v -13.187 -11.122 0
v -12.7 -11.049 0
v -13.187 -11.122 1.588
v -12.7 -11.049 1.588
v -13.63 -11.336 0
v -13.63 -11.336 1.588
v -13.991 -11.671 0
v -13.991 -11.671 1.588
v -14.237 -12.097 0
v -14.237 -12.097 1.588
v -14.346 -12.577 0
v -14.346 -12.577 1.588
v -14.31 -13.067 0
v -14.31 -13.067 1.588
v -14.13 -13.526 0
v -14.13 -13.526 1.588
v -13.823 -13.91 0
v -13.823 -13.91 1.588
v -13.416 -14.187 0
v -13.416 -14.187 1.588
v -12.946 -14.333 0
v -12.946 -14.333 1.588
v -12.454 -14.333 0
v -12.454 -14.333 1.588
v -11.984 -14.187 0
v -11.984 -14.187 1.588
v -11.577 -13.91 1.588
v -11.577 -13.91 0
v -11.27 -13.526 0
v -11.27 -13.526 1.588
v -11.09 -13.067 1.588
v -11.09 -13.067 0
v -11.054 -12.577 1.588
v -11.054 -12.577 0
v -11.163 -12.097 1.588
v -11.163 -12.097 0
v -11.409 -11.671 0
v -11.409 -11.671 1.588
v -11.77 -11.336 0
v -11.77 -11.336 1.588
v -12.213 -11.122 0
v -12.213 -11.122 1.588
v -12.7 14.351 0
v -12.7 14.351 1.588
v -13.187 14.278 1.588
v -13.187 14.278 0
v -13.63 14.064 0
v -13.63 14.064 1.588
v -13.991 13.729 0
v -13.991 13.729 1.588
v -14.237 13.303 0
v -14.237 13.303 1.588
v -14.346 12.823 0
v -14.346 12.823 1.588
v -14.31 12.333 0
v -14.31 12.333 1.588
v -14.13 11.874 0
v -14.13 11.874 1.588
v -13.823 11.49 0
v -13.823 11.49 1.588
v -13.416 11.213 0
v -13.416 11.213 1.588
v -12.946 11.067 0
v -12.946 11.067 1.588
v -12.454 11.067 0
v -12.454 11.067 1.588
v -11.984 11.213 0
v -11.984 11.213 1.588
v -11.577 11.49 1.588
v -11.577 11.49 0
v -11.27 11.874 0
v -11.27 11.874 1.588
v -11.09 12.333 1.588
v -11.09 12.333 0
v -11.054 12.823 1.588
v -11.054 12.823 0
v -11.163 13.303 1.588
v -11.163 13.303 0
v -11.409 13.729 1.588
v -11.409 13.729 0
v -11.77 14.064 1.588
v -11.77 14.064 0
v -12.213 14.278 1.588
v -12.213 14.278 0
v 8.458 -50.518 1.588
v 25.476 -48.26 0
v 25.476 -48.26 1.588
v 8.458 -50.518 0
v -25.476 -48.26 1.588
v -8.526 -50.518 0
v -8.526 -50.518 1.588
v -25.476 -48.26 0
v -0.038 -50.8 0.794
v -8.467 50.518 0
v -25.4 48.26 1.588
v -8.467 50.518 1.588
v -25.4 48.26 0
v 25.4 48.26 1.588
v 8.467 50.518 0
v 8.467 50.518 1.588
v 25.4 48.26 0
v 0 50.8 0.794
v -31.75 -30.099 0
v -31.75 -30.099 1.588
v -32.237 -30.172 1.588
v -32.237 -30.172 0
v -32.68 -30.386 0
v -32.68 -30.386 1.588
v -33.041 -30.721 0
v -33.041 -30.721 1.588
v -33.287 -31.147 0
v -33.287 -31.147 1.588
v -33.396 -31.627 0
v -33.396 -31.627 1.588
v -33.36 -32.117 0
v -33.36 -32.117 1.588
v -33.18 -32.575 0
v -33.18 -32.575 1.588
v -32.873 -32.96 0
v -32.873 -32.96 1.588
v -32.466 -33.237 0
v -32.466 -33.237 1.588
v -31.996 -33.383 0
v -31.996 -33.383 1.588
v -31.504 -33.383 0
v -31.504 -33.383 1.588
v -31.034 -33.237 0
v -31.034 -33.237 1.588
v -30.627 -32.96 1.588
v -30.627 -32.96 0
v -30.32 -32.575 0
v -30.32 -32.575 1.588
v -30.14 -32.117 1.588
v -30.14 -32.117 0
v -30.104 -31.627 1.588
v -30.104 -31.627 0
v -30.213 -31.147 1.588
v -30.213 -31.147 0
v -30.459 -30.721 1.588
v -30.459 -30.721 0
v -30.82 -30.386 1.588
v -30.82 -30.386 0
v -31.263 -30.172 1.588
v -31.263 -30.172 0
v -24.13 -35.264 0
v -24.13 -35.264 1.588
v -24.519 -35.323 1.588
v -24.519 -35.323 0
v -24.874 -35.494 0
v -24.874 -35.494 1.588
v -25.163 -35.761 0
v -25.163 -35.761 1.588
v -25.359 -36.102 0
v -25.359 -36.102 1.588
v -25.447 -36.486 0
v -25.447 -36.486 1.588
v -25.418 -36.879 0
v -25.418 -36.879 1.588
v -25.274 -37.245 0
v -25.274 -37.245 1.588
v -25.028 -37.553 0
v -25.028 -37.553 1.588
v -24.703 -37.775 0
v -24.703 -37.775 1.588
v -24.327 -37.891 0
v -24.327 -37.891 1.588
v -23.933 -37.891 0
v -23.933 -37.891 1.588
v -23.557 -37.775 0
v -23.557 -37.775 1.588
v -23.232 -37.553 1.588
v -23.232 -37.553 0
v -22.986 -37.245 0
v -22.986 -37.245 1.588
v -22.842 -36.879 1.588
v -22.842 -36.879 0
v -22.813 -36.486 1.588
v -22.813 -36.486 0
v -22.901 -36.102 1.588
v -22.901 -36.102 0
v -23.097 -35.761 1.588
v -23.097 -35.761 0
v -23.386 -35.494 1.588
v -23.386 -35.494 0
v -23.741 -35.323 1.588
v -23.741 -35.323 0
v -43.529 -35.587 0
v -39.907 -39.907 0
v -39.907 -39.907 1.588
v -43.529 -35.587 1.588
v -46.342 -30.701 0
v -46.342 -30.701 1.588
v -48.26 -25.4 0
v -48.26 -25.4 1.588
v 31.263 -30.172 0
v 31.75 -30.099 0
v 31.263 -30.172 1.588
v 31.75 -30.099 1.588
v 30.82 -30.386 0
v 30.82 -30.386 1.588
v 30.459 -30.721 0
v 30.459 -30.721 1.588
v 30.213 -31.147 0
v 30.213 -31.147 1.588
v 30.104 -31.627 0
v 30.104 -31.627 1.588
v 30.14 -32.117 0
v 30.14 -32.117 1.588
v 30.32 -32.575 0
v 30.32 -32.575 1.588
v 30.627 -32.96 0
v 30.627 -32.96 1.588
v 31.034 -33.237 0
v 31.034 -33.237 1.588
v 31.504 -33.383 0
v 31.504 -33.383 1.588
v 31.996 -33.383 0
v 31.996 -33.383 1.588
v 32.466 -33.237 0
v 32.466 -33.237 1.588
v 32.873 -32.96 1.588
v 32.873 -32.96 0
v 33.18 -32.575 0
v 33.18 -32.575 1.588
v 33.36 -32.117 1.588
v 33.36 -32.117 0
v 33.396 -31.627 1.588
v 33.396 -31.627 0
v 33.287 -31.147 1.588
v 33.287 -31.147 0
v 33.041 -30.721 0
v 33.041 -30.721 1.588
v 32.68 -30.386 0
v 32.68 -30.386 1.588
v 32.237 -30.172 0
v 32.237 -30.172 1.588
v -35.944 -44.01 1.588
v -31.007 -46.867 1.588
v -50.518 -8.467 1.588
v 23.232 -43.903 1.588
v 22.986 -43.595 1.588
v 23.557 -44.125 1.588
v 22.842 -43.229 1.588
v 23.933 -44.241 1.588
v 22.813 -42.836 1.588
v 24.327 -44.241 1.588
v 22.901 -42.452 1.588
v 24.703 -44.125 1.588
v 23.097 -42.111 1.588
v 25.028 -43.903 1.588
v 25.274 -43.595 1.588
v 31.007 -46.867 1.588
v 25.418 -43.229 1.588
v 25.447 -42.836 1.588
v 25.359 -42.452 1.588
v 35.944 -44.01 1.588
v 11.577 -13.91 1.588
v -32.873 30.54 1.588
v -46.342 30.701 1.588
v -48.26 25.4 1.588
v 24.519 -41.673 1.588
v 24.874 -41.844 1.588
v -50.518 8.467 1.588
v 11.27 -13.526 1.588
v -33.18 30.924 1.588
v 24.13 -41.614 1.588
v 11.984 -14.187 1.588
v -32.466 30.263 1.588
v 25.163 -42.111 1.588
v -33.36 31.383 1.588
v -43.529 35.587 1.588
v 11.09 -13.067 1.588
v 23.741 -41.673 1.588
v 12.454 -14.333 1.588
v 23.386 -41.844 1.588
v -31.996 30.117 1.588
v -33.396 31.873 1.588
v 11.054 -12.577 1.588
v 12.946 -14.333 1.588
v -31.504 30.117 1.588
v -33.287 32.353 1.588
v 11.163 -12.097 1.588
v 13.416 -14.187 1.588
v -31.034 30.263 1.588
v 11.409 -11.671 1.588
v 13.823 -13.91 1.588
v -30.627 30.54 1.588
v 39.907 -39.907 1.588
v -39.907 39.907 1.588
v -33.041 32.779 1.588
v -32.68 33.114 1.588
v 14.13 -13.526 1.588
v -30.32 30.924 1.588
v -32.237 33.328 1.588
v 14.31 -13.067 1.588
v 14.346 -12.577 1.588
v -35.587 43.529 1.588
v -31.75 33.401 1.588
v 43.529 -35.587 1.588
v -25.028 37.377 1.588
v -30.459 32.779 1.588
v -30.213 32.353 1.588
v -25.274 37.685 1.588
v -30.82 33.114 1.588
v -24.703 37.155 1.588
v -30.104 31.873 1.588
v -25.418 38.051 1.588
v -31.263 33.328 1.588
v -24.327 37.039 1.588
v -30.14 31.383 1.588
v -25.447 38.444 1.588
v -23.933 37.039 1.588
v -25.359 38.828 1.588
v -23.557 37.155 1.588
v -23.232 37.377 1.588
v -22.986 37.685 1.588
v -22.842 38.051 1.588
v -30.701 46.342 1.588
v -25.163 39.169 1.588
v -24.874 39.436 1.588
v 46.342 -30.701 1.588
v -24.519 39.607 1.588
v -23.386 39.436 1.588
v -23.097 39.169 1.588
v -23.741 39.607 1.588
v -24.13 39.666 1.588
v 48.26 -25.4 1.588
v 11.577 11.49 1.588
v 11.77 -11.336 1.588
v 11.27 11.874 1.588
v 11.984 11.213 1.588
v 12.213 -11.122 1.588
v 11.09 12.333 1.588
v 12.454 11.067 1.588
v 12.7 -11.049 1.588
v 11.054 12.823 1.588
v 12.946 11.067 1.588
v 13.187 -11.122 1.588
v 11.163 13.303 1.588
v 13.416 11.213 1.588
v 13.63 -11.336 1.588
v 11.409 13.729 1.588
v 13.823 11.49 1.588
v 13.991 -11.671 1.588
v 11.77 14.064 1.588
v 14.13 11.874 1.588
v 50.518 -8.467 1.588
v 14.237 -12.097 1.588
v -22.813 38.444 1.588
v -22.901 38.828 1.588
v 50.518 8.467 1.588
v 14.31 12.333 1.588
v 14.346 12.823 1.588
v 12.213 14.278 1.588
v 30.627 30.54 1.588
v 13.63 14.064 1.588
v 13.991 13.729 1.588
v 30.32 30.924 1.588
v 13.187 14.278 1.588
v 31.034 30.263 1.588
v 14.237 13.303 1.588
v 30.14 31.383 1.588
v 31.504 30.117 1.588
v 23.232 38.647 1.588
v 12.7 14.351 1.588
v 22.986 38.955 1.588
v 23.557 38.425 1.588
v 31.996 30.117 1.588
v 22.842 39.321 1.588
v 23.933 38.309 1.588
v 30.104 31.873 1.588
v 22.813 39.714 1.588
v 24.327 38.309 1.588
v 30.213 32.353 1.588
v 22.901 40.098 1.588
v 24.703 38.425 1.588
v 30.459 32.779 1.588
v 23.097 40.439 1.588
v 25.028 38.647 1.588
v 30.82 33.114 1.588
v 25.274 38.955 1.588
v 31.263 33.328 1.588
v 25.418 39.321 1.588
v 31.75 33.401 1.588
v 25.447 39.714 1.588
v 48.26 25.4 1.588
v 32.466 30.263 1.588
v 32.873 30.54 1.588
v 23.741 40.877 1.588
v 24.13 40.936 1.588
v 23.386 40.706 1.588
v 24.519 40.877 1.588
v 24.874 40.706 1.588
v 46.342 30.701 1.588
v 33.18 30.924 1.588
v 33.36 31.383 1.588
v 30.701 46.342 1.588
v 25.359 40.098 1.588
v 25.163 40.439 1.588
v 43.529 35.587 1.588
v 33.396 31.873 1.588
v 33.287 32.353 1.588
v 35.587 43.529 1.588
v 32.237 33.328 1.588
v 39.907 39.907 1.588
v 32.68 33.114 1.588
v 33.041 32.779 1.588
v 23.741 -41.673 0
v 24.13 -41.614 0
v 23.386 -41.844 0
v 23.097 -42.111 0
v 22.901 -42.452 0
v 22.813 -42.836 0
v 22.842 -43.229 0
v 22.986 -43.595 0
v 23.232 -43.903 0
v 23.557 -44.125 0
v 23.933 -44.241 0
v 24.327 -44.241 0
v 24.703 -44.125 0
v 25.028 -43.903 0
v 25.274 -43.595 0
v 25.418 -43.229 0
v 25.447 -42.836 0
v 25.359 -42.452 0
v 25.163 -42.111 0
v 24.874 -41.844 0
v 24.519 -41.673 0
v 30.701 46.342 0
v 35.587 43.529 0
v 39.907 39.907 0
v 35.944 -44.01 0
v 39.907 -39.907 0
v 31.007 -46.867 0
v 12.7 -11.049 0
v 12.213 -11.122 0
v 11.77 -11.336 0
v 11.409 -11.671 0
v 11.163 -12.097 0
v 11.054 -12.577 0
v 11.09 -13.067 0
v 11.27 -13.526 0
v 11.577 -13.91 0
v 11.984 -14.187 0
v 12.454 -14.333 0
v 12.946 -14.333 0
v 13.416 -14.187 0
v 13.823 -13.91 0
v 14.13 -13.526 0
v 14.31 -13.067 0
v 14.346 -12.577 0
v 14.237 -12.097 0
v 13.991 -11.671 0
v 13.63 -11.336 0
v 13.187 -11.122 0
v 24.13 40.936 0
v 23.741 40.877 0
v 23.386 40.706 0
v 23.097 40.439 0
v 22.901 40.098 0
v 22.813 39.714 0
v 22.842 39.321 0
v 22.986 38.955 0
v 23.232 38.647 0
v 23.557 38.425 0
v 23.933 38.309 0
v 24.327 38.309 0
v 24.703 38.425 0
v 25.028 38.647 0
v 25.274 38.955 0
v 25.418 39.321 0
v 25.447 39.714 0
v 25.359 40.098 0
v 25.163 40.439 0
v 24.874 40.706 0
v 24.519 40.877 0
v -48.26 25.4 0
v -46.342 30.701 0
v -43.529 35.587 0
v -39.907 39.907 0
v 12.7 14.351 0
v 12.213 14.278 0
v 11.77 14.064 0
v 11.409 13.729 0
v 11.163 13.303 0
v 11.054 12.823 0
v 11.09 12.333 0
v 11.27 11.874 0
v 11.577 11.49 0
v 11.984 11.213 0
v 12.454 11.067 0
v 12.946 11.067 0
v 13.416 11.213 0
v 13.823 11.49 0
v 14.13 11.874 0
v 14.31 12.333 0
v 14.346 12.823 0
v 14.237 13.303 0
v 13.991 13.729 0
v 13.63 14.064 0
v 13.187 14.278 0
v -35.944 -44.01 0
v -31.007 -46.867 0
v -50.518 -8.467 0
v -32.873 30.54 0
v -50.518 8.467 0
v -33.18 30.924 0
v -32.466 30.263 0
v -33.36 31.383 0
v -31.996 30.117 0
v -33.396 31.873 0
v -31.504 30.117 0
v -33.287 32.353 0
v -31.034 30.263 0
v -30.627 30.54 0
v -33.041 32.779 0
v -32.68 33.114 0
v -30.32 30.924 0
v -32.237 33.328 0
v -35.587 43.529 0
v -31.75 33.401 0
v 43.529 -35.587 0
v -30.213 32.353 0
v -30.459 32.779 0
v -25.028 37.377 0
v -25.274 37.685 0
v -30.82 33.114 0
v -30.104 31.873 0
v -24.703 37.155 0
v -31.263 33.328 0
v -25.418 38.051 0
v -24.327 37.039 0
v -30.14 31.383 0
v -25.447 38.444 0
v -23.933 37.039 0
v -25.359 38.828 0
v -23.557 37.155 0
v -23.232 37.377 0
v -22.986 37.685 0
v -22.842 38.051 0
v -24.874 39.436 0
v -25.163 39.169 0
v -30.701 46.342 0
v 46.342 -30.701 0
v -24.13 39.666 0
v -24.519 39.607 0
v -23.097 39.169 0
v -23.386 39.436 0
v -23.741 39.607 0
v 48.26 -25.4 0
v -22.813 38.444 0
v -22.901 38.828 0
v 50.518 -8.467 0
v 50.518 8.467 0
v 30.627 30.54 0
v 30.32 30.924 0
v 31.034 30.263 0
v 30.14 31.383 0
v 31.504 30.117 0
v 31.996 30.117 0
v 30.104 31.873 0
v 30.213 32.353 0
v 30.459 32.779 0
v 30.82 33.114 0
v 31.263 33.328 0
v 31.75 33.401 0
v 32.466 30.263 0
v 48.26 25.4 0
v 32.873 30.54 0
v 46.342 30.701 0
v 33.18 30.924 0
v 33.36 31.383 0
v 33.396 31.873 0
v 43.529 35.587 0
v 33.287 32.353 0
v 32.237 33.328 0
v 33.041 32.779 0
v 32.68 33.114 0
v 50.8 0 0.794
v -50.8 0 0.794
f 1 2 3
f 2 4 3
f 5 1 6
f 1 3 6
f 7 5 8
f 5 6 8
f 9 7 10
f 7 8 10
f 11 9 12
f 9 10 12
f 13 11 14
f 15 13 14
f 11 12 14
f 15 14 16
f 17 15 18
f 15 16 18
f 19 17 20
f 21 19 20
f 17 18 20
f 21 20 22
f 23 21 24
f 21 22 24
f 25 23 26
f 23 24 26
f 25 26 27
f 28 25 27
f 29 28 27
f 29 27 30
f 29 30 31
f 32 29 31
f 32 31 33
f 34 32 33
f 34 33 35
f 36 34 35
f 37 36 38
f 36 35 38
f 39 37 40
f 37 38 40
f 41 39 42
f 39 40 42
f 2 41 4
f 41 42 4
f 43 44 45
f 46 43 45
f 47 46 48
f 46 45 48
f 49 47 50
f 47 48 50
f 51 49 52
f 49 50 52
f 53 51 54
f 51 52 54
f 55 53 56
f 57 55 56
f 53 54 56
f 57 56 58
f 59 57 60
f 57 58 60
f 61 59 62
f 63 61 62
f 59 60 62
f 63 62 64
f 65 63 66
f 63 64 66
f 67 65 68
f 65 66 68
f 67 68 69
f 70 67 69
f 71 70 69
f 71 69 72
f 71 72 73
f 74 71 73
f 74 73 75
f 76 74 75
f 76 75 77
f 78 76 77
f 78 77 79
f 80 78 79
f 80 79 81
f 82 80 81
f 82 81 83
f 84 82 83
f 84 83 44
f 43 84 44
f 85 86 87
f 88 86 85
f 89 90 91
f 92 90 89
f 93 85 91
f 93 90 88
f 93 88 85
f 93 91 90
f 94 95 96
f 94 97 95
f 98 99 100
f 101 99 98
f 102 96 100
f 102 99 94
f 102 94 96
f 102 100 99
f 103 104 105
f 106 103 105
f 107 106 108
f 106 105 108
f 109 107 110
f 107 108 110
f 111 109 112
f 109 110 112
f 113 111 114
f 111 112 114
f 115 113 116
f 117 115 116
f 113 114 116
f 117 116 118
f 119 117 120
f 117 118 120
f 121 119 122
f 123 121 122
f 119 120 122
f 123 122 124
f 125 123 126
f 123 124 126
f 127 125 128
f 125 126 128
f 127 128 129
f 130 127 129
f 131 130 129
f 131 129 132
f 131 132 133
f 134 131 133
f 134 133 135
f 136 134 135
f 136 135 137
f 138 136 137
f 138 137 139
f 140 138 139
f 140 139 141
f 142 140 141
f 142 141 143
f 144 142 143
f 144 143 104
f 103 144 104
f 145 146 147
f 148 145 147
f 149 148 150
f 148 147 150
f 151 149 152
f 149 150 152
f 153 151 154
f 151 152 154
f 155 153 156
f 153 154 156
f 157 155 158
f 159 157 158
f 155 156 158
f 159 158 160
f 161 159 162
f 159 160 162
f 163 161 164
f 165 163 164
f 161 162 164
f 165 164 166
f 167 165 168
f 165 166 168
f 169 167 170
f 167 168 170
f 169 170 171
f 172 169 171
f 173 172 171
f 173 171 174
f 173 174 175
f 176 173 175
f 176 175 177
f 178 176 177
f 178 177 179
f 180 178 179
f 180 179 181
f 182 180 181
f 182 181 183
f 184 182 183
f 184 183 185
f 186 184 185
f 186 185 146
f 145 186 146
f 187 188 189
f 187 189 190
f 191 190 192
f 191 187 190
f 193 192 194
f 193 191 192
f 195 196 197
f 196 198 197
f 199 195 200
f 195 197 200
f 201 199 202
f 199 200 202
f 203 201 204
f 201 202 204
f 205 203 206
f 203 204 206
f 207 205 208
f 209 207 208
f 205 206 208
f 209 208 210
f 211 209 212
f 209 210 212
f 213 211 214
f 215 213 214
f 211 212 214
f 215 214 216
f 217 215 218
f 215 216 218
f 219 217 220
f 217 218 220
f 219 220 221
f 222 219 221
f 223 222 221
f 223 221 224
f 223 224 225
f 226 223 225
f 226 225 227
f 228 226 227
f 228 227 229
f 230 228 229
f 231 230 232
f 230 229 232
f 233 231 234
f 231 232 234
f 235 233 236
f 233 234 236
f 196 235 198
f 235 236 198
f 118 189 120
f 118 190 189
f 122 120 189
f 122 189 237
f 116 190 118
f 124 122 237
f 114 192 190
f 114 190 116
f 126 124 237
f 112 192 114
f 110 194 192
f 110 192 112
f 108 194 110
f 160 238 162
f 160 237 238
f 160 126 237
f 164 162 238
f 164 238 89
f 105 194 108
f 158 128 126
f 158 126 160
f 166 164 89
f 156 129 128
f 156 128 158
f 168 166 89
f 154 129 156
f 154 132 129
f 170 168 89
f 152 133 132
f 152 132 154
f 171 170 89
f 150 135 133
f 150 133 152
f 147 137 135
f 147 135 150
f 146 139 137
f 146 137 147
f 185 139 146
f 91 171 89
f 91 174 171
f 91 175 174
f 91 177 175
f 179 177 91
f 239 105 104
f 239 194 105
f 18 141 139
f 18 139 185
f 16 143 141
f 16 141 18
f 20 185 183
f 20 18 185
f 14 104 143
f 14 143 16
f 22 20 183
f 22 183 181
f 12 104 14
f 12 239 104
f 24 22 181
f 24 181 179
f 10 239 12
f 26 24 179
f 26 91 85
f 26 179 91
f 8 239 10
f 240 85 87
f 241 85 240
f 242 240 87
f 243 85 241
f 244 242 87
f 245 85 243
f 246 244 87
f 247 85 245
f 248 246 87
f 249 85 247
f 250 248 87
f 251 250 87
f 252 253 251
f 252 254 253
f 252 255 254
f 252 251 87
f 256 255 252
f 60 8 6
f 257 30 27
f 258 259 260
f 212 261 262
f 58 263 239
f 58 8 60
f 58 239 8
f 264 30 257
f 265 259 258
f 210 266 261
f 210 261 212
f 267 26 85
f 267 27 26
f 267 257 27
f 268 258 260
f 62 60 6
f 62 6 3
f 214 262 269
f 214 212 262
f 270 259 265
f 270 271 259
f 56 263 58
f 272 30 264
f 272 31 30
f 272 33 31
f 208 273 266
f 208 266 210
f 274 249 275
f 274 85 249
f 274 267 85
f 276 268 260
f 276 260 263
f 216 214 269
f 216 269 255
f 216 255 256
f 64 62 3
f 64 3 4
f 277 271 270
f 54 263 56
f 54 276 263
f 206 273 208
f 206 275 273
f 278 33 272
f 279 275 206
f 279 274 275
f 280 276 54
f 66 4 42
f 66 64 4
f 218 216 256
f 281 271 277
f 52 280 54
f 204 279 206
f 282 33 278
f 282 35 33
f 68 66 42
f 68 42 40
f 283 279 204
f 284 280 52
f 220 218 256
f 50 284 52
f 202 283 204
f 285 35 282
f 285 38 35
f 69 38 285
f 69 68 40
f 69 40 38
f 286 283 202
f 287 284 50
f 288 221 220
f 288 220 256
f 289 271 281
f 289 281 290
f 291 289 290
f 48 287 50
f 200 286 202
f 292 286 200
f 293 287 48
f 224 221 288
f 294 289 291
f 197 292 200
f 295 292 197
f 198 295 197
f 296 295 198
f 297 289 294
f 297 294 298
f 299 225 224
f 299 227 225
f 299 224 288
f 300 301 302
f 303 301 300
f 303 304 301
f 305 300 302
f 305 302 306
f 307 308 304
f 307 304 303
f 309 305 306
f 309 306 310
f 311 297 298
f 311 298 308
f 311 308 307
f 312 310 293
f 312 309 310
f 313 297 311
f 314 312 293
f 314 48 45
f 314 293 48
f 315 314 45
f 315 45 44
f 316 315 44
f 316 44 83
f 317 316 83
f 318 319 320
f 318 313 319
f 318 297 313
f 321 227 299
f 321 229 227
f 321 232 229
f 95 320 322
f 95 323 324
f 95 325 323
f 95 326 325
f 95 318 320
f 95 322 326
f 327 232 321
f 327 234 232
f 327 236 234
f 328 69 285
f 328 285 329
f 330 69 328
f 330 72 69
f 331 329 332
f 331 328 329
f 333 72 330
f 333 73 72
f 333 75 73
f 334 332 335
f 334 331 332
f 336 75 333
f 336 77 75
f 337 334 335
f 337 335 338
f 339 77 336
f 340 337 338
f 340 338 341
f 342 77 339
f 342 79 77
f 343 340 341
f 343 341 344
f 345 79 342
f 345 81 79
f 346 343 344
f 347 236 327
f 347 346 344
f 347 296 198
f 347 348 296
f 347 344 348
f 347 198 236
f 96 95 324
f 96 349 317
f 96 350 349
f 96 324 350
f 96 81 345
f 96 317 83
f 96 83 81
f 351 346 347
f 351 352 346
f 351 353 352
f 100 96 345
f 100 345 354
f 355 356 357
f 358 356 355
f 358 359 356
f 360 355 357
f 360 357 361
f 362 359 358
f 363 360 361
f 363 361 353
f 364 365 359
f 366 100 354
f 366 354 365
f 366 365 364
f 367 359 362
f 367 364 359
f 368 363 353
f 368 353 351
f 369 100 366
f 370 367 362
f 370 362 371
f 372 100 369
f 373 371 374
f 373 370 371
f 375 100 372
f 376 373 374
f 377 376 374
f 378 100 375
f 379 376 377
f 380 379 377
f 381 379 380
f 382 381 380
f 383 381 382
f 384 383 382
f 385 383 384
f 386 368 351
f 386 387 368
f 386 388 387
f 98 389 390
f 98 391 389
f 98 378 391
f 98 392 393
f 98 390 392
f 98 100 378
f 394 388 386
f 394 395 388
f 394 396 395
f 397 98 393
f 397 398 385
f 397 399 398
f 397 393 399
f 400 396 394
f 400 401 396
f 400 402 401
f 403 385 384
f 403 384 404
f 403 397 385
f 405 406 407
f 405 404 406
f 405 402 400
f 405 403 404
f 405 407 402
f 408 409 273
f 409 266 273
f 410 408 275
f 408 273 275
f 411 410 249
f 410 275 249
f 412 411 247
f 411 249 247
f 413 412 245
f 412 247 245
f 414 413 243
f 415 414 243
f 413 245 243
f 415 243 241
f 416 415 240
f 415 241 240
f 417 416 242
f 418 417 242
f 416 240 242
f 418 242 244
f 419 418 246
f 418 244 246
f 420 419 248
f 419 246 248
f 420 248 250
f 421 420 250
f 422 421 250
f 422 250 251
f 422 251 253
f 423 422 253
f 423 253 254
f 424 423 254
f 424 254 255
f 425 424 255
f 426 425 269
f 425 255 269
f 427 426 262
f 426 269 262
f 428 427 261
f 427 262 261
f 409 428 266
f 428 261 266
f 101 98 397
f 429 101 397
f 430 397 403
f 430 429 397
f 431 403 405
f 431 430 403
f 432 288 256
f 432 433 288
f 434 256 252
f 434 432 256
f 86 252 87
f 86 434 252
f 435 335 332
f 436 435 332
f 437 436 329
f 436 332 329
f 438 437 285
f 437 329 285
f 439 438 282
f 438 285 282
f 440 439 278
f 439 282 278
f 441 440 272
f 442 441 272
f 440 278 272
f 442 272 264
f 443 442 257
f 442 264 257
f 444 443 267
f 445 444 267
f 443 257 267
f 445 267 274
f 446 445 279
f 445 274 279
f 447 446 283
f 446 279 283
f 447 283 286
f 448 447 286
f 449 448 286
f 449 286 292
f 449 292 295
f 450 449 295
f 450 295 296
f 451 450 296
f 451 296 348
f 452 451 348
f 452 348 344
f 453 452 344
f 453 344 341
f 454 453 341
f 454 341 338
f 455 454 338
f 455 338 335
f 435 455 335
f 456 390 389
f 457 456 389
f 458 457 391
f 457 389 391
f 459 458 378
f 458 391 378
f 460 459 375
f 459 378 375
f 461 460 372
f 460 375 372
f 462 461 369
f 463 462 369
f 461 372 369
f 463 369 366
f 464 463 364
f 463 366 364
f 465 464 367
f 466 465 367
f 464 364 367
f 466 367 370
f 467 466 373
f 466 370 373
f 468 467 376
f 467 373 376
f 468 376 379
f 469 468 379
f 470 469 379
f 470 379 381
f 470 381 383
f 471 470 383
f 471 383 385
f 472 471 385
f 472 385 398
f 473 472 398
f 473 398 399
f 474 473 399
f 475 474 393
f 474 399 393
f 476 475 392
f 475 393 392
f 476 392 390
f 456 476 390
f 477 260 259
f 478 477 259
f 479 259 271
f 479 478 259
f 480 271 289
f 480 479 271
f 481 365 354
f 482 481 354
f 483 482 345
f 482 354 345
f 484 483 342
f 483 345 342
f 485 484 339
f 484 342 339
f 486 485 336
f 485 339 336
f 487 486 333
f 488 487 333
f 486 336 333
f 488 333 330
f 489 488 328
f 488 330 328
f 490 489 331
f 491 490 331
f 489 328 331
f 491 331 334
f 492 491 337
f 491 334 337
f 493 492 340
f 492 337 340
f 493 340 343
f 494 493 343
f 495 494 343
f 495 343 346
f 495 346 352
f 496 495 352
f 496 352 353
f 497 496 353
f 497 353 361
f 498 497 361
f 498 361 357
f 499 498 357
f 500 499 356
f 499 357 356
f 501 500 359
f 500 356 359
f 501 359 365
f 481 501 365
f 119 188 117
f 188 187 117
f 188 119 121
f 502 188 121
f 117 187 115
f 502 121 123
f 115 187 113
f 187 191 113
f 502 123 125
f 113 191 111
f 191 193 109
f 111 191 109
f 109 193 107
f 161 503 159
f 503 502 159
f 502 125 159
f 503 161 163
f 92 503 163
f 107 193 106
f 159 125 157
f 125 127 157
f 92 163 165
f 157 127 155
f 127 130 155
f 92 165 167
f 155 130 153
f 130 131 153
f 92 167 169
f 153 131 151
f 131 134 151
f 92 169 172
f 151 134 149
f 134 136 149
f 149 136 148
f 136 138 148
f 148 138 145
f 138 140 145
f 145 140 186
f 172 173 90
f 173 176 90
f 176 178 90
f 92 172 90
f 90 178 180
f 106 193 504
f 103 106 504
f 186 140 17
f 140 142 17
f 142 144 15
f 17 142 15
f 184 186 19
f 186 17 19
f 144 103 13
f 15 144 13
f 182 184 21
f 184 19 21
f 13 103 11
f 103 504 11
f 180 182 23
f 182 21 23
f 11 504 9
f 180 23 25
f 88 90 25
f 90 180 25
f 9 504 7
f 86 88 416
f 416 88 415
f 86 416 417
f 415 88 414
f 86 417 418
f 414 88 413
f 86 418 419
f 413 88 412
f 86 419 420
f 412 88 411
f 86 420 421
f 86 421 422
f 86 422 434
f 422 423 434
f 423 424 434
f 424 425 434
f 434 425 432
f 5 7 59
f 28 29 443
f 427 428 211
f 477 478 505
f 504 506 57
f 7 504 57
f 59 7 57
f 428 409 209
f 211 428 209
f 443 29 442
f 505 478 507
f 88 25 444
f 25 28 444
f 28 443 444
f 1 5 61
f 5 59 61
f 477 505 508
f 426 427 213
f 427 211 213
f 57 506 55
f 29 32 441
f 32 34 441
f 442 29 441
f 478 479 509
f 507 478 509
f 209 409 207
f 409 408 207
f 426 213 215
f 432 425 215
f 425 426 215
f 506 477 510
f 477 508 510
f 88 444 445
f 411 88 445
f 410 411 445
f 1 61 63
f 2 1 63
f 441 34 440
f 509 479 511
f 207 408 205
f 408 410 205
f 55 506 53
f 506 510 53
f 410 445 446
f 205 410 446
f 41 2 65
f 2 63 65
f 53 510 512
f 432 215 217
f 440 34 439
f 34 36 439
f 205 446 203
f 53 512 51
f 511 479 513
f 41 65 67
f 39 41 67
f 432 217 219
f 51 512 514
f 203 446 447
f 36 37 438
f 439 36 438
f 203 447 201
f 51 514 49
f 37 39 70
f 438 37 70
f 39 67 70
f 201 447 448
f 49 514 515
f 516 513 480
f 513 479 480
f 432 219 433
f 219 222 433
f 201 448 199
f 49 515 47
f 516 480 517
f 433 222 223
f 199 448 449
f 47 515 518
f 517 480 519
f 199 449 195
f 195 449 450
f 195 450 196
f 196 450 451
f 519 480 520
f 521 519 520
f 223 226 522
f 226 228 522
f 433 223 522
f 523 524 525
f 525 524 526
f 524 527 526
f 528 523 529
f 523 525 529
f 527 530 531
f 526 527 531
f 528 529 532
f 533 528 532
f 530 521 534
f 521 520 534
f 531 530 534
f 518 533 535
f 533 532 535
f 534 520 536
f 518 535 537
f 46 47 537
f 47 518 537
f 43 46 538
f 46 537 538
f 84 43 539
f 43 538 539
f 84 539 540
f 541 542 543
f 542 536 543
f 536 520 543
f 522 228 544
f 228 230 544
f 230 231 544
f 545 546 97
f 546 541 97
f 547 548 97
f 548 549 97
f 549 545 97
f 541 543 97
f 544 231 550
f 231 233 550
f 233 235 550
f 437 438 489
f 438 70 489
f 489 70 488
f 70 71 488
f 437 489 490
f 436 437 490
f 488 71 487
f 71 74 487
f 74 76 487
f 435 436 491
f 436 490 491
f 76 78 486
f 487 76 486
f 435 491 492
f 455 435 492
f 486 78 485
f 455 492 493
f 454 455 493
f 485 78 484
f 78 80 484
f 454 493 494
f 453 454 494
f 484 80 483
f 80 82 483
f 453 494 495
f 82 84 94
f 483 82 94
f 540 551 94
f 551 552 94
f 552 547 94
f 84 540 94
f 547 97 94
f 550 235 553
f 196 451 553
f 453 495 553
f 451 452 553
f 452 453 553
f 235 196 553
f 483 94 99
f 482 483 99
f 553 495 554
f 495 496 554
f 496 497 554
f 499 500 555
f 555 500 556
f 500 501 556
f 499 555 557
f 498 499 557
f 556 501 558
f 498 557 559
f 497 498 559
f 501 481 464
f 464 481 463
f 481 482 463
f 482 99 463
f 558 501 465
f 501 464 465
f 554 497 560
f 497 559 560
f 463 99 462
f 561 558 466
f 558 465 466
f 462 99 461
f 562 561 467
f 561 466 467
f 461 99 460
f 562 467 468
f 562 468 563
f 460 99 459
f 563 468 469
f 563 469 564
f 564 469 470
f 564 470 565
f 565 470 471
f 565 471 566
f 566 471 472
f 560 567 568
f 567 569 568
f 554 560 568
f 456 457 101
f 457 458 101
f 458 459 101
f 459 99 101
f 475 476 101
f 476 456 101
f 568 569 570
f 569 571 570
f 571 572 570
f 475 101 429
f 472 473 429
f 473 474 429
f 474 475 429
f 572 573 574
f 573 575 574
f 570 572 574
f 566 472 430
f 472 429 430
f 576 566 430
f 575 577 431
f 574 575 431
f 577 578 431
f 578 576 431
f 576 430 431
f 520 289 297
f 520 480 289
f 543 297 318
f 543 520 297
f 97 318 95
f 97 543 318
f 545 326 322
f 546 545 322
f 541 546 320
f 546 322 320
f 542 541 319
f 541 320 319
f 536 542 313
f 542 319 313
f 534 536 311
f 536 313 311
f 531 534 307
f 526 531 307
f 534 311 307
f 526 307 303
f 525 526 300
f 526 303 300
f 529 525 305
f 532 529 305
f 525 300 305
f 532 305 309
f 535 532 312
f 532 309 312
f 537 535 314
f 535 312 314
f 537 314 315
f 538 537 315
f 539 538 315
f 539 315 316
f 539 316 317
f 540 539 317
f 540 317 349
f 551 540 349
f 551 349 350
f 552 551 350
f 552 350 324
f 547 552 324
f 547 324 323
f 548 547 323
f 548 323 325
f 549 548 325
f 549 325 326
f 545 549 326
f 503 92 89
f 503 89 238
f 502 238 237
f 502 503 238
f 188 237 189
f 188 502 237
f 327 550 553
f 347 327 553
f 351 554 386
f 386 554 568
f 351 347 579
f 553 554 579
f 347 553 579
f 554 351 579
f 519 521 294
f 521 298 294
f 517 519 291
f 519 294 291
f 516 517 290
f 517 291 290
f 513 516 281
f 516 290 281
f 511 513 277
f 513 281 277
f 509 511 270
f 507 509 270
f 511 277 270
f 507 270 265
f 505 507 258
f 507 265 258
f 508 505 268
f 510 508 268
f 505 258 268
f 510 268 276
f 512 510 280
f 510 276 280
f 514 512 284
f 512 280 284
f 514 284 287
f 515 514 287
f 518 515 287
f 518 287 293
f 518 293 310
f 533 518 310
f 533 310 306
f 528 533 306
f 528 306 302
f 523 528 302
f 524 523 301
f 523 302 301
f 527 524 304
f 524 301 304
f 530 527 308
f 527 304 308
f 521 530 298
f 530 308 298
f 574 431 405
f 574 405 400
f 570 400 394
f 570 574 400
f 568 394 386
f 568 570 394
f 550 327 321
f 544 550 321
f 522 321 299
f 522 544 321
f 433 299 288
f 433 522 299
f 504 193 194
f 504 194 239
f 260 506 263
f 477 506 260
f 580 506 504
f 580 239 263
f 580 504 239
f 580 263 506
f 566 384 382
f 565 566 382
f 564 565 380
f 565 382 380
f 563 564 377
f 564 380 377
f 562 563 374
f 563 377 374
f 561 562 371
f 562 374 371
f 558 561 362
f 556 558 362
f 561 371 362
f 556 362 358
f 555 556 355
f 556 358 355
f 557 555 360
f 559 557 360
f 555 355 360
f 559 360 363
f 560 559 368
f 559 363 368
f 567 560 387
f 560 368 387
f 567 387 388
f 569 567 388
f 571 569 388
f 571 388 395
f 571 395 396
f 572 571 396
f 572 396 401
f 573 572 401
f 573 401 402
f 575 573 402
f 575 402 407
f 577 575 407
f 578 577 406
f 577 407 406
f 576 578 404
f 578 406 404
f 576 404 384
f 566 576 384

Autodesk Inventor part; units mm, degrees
ref_plane "YZ Plane" through (0, 0, 0) normal (1, 0, 0) x (0, 1, 0)
ref_plane "XZ Plane" through (0, 0, 0) normal (0, 1, 0) x (-1, 0, 0)
ref_plane "XY Plane" through (0, 0, 0) normal (0, 0, 1) x (1, 0, 0)
sketch "Sketch1" plane through (0, 0, 0) normal (0, 0, 1) x (1, 0, 0)
  line L0 (0, 3.1673) -> (0, -2.4908)
  spline S0 degree 2 poles (-48.26, -25.4) (-53.34, 0) (-48.26, 25.4) knots 0 0 0 1 1 1
  line L1 (-20.5368, 0) -> (25.7294, 0)
  line L2 (0, 0) -> (-9.8402, -9.8402)
  line L3 (0, 0) -> (13.9161, 0) construction
  line L4 (0, 0) -> (-23.2805, 23.2805)
  arc A0 (-39.9068, 39.9068) -> (-48.26, 25.4) centre (-17.1376, 17.1376) ccw
  arc A1 (-48.26, -25.4) -> (-39.9068, -39.9068) centre (-17.1376, -17.1376) ccw
  spline S1 degree 2 poles (48.26, -25.4) (53.34, 0) (48.26, 25.4) knots 0 0 0 1 1 1
  arc A2 (48.26, 25.4) -> (39.9068, 39.9068) centre (17.1376, 17.1376) ccw
  arc A3 (39.9068, -39.9068) -> (48.26, -25.4) centre (17.1376, -17.1376) ccw
  spline S2 degree 2 poles (25.476, -48.26) (-0.0768, -53.34) (-25.476, -48.26) knots 0 0 0 1 1 1
  arc A4 (-39.9068, -39.9068) -> (-25.476, -48.26) centre (-23.264, -27.7968) ccw
  arc A5 (25.476, -48.26) -> (39.9068, -39.9068) centre (23.264, -27.7968) ccw
  spline S3 degree 2 poles (-25.4, 48.26) (0, 53.34) (25.4, 48.26) knots 0 0 0 1 1 1
  arc A6 (39.9068, 39.9068) -> (25.4, 48.26) centre (17.1376, 17.1376) ccw
  arc A7 (-25.4, 48.26) -> (-39.9068, 39.9068) centre (-17.1376, 17.1376) ccw
  point P0 (-50.8, 0)
  point P1 (50.8, 0)
  point P2 (-0.076, -50.8)
  point P3 (0, 50.8)
  point P4 (-12.7, 12.7)
  point P5 (-31.75, 31.75)
  point P6 (-31.75, -31.75)
  point P7 (-12.7, -12.7)
  point P8 (12.7, 12.7)
  point P9 (31.75, 31.75)
  point P10 (31.75, -31.75)
  point P11 (12.7, -12.7)
  point P12 (24.13, -42.935)
  point P13 (24.13, 39.615)
  point P14 (-24.13, 38.345)
  point P15 (-24.13, -36.585)
  dimension "d23" = 1.5875
  dimension "d24" = 0
  dimension "d1" = 45
  dimension "d6" = 50.8
  dimension "d7" = 25.4
  dimension "d8" = 48.26
  dimension "d15" = 48.26
  dimension "d16" = 50.8
  dimension "d17" = 25.4
  dimension "d19" = 25.4
  dimension "d20" = 50.8
  dimension "d21" = 48.26
  dimension "d22" = 25.4
  dimension "d25" = 12.7
  dimension "d26" = 31.75
  dimension "d34" = 48.26
  dimension "d38" = 48.26
  dimension "d39" = 6.35
  dimension "d40" = 82.55
  dimension "d41" = 1.27
  dimension "d42" = 48.26
  dimension "d43" = 0
  dimension "d44" = 24.13
extrude "Extrusion1" add sketch "Sketch1" along normal blind 1.5875
hole "Hole1" at (-12.7, 12.7, 0) at (-31.75, 31.75, 0) at (-31.75, -31.75, 0) at (-12.7, -12.7, 0) at (31.75, 31.75, 0) at (12.7, 12.7, 0) at (12.7, -12.7, 0) at (31.75, -31.75, 0) direction (0, 0, 1) diameter 3.302 end through all thread size "8-32 UNC" class "2B" standard "ANSI Unified Screw Threads"
hole "Hole2" at (24.13, -42.935, 0) at (24.13, 39.615, 0) at (-24.13, 38.345, 0) at (-24.13, -36.585, 0) direction (0, 0, 1) diameter 2.6416 end through all thread size "6-32 UNC" class "2B" standard "ANSI Unified Screw Threads"
equation "\"d15\" = d8"
equation "\"d16\" = d6"
equation "\"d20\" = d6"
equation "\"d21\" = d8"
properties part number "Base"
